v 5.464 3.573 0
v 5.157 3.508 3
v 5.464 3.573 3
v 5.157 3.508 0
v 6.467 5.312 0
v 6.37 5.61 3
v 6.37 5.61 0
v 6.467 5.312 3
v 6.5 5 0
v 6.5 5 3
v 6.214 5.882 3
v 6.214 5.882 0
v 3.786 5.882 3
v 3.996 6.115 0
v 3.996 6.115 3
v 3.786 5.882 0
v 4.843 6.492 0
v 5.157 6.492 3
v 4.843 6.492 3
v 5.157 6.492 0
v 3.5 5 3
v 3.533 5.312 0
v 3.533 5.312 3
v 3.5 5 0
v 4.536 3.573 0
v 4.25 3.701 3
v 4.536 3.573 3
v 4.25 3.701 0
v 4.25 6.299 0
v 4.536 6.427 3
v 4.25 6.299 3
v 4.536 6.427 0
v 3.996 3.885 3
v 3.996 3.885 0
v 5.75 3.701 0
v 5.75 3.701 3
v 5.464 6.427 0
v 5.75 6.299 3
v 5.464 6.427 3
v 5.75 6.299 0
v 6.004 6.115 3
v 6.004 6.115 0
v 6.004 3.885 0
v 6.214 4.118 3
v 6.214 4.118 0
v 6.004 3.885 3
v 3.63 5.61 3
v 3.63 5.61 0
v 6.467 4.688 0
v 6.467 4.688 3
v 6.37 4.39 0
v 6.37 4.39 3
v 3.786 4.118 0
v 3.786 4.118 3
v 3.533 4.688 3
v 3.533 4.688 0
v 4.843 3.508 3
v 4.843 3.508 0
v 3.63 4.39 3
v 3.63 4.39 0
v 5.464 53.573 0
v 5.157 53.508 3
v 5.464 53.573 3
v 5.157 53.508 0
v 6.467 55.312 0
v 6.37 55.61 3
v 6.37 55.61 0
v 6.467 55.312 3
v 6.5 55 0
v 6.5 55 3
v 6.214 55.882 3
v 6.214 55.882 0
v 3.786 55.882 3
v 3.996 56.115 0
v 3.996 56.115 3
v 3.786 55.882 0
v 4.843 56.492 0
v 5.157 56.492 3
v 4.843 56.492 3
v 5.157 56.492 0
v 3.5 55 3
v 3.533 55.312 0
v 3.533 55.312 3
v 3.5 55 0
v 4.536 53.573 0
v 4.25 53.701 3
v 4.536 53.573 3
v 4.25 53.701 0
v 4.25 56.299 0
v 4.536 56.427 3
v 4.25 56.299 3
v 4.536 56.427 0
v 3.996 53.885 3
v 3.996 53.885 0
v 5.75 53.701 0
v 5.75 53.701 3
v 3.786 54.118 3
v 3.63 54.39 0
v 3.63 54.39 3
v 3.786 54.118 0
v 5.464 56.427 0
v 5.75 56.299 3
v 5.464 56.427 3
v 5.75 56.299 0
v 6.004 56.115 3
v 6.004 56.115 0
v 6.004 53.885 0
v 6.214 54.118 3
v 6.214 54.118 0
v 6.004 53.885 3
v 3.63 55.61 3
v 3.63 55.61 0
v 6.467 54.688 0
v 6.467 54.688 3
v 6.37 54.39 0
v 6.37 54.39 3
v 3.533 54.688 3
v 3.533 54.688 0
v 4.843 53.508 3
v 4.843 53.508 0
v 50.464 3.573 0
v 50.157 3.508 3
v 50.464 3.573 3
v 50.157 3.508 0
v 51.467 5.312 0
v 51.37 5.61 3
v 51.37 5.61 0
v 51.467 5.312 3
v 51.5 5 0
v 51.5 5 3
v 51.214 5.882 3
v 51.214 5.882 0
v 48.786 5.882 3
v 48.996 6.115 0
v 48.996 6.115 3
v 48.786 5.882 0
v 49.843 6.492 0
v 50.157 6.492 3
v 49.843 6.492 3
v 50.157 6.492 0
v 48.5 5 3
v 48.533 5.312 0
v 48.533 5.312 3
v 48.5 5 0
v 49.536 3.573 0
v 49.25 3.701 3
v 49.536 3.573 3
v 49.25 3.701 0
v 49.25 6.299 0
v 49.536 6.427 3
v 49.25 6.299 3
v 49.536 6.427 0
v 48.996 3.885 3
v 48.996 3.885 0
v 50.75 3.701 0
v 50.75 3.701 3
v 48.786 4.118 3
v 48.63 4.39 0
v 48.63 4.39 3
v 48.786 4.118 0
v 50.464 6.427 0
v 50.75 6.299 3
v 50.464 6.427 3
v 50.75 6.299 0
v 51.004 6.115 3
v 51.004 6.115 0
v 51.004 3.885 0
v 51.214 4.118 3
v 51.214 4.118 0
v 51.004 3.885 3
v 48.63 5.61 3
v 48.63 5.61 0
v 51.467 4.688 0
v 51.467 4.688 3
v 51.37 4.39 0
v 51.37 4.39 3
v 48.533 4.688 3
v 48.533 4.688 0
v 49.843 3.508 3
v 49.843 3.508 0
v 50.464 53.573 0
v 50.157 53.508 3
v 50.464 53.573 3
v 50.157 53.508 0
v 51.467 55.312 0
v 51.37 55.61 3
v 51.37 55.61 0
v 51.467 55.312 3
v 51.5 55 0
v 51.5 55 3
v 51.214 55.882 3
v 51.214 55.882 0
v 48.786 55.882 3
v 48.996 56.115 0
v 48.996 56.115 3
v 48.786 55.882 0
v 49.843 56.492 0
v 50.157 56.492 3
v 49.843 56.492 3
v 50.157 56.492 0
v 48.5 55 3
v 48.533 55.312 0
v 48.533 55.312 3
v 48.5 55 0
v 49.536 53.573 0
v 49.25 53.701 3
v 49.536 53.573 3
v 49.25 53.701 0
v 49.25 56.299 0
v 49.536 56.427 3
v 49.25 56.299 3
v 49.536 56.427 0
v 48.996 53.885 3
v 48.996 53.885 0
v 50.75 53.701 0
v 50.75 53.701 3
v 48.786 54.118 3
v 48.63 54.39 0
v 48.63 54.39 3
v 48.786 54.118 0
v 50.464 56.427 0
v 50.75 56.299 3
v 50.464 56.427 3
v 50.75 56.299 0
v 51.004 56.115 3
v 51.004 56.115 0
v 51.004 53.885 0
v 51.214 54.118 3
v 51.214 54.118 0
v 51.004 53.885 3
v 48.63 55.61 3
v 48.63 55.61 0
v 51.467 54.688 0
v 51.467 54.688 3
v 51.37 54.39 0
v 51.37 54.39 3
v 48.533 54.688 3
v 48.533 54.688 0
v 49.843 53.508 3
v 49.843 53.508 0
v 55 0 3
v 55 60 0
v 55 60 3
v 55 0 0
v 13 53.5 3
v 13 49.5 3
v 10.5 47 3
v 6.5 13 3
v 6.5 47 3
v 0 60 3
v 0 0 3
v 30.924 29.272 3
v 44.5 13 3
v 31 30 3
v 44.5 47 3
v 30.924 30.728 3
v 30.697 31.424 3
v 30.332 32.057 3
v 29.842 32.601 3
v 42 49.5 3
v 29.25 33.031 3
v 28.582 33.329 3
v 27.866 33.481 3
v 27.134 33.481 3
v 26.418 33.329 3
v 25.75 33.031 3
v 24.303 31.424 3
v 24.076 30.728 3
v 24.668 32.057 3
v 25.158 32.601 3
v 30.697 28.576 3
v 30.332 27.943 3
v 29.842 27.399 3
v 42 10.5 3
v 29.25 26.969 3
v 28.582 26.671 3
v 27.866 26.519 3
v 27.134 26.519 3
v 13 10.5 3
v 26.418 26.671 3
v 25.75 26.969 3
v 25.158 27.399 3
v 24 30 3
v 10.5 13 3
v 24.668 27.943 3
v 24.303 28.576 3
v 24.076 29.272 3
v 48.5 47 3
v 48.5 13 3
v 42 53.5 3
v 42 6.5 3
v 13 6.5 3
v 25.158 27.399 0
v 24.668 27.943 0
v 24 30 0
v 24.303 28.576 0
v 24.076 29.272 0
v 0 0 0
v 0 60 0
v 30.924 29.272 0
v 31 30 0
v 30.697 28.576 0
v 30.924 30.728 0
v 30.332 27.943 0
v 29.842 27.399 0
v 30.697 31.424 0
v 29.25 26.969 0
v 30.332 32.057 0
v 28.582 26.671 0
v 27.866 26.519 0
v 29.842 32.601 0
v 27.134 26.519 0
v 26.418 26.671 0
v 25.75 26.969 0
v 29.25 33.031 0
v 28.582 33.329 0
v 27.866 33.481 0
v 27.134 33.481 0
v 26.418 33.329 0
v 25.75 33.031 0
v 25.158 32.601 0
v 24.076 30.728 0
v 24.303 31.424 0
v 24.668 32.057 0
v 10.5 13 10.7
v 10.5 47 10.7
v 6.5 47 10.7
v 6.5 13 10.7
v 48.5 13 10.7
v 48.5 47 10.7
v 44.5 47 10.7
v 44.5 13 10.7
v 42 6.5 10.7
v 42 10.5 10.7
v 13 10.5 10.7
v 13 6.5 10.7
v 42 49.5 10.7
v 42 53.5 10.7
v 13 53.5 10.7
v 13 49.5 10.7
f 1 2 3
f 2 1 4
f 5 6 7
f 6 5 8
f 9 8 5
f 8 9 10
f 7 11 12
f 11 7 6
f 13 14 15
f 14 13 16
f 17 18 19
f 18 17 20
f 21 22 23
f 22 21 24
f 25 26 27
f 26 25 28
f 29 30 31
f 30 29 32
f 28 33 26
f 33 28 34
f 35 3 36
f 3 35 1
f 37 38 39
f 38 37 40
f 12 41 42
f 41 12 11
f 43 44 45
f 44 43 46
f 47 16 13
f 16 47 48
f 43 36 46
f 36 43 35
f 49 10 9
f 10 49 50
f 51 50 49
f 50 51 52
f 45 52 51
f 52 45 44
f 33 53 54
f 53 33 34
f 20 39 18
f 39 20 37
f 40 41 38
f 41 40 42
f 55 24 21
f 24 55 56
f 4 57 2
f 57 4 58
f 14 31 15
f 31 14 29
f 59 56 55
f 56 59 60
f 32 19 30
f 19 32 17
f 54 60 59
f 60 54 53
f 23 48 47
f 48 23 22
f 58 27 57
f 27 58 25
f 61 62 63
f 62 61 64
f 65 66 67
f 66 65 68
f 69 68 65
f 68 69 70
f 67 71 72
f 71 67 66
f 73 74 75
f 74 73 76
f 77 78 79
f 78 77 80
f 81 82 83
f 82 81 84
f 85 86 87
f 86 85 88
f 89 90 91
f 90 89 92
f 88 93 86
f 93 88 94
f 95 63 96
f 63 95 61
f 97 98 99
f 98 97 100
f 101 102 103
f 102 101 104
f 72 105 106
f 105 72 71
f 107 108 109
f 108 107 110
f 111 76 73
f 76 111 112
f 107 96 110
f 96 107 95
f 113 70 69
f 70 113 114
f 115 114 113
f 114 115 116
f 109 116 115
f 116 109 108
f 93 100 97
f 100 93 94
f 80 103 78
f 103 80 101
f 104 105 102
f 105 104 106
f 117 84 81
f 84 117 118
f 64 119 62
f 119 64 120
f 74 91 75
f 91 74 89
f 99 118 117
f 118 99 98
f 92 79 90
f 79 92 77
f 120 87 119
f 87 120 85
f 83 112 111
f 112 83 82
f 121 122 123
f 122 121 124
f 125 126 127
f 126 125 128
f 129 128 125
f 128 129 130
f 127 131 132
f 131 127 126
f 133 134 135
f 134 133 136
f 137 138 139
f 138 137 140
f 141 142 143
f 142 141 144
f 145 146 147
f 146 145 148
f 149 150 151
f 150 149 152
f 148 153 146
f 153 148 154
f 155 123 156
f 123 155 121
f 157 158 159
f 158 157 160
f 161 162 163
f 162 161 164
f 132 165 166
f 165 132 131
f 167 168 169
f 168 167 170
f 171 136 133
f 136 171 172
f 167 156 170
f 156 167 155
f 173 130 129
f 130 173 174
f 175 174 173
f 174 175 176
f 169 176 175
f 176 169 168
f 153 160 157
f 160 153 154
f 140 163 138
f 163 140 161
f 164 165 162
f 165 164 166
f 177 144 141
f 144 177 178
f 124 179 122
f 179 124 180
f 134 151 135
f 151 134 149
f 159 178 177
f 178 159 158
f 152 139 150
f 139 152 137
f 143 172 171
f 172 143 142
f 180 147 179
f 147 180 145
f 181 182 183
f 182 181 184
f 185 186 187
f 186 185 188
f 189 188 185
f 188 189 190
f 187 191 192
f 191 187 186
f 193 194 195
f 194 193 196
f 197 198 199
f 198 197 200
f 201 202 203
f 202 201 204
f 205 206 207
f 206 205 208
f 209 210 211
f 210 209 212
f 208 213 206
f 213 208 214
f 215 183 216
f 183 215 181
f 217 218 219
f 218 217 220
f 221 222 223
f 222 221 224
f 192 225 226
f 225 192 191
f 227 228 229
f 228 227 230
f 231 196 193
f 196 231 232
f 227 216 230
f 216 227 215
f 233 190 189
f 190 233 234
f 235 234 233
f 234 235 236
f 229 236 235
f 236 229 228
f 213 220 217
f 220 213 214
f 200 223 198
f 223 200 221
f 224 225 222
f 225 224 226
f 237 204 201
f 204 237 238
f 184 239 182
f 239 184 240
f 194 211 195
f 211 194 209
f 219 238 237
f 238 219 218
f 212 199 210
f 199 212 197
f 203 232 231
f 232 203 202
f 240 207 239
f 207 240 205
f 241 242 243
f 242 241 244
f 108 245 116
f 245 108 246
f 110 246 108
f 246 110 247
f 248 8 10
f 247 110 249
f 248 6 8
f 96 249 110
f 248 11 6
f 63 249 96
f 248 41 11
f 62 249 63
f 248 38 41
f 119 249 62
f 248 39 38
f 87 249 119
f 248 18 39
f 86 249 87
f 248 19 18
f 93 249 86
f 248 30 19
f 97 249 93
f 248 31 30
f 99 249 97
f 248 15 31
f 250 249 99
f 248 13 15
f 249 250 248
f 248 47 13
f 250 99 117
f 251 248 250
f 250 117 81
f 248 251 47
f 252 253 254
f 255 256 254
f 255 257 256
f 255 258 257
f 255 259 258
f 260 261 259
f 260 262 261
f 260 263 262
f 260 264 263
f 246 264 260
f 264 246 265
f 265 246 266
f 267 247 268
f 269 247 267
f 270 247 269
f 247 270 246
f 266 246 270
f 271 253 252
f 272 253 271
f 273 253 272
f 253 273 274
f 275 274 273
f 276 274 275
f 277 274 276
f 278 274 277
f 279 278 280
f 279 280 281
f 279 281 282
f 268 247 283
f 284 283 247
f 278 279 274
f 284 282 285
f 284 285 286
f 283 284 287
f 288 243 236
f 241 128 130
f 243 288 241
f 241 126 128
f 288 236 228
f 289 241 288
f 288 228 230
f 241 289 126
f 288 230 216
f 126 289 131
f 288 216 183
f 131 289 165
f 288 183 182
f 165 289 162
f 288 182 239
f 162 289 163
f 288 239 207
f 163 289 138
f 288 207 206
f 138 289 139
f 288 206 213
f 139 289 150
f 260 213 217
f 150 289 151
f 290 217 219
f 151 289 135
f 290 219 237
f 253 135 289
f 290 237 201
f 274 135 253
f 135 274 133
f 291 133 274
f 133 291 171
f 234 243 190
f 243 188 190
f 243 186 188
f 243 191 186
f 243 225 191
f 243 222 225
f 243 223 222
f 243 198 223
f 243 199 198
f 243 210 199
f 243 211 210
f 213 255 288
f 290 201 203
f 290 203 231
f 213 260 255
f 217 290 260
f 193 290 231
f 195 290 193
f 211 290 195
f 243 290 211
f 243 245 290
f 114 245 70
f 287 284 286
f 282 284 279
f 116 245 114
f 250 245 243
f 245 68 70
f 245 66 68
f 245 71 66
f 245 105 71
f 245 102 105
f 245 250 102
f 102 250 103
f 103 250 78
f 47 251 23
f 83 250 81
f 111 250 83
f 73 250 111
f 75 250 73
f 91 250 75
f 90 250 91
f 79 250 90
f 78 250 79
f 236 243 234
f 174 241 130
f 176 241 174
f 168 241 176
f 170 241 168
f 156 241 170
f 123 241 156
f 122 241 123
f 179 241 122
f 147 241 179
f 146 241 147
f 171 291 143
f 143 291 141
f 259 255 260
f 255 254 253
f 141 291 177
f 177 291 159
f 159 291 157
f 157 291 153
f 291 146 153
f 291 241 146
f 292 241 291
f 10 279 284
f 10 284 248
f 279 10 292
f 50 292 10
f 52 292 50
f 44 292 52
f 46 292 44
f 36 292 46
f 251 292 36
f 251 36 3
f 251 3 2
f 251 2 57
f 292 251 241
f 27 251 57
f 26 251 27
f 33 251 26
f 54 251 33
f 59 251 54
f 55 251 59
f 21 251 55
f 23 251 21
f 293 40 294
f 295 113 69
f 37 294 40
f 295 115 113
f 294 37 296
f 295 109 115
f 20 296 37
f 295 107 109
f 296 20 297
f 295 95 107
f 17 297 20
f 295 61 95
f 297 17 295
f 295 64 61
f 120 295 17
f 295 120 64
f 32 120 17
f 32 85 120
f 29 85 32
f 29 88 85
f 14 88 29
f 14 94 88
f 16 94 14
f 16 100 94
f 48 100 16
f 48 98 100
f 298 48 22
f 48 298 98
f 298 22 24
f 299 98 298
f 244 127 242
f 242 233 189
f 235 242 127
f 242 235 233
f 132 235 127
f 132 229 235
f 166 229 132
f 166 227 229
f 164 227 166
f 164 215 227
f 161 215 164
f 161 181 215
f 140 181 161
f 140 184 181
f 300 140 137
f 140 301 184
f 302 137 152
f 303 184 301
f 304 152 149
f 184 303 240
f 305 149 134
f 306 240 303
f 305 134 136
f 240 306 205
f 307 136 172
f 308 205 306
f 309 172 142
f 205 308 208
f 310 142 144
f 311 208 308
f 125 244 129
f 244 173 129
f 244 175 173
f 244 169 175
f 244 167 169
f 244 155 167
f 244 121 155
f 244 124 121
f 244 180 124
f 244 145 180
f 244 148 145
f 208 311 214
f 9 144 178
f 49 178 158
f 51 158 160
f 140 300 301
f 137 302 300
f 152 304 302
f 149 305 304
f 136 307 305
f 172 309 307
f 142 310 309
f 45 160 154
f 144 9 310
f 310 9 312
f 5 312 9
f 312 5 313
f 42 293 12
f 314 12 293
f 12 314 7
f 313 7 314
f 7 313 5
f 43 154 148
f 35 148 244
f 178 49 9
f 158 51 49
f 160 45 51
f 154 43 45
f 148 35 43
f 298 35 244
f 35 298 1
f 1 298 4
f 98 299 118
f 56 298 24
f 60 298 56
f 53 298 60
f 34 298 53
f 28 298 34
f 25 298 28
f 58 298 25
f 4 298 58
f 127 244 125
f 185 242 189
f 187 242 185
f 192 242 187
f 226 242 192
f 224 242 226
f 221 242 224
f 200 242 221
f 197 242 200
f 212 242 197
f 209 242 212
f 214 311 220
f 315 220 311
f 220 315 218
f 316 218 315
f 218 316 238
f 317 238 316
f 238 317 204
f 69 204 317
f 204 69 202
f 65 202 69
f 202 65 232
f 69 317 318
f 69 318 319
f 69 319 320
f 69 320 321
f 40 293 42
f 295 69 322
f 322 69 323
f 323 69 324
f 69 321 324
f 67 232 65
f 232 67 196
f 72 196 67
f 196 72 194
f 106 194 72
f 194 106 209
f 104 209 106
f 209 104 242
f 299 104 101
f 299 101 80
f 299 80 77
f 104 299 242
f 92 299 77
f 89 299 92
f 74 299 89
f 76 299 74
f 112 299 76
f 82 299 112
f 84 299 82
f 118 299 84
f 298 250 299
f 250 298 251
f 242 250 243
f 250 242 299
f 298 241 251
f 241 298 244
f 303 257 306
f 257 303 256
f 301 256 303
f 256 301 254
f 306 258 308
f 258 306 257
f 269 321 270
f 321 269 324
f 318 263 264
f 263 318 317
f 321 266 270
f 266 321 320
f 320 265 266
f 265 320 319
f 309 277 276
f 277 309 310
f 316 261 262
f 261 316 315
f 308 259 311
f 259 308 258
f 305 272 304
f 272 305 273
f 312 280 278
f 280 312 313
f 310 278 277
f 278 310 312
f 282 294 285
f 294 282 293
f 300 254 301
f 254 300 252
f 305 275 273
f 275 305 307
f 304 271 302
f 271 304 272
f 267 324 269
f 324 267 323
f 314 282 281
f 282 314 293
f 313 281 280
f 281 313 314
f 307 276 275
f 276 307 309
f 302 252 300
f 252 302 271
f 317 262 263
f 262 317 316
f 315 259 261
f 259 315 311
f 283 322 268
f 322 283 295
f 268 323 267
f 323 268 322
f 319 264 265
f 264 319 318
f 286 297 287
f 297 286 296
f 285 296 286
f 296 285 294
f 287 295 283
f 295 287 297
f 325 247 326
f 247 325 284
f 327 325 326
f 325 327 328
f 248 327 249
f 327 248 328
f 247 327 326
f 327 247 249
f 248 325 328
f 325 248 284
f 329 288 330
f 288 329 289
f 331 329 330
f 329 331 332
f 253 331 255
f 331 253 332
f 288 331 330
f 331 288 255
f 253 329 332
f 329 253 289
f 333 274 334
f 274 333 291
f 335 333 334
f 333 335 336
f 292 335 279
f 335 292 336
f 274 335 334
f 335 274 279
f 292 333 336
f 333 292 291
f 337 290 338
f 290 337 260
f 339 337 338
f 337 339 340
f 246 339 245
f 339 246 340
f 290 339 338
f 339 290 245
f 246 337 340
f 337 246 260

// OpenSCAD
// file: potentiometer-insert.scad
/*
  3d printable insert for a control panel
  An array of potentiometers may be mounted to the insert.
  The insert can then be mounted into to the face of the control
  panel.

  The idea is, it's easy to cut a large hole in a piece of 1/4 inch
  plywood into which the insert may be fitted, but is is difficult
  (impossible) to cut the tiny holes needed for each individual fader
  in such plywood, and anyway the plywood is too thick.

  To use this file, set the following variables (in mm) and then
  include this file.

  These are intentionally commented out here.

plate_thickness = 3;
countersink = 0.01;
pot_horizontal_spacing = 25;
pot_vertical_spacing = 30;
pot_cols = 4;
pot_rows = 5;
hole_radius = 3.5;
plate_horizontal_border = 15;
plate_vertical_border = 15;
plate_height = pot_rows * pot_vertical_spacing + 2 * plate_vertical_border;
plate_width =  pot_cols * pot_horizontal_spacing + 2 * plate_horizontal_border;
screw_radius = 0.5 * 3; 
screw_edge_offset = 5;

web_thickness = 3;
web_height = 8;
web_edge_offset = screw_edge_offset + screw_radius;
web_screw_offset = 2 * web_edge_offset;
web_horiz_len = plate_width - 2 * web_screw_offset;
web_vert_len = plate_height - 2 * web_screw_offset;

*/

$fn=30;

module undrilled_plate()
{
	cube(size = [plate_width, plate_height, plate_thickness]);
}

module drill_hole(x, y, r)
{
	translate(v = [x, y, -plate_thickness * 0.05])
		cylinder(r1 = r, r2 = r, h = plate_thickness * 1.1);
}

module plate_pot_holes()
{
	for (row = [0 : 1 : pot_rows - 1]) {
		y = plate_vertical_border + (row + 0.5) * pot_vertical_spacing;
		for (col = [0 : 1 : pot_cols - 1]) {
			x = plate_horizontal_border + (col + 0.5) * pot_horizontal_spacing;
			drill_hole(x, y, hole_radius);
		}
	}
}

module plate_screw_holes()
{
	drill_hole(screw_edge_offset, screw_edge_offset, screw_radius);
	drill_hole(screw_edge_offset, plate_height - screw_edge_offset, screw_radius);
	drill_hole(plate_width - screw_edge_offset, screw_edge_offset, screw_radius);
	drill_hole(plate_width - screw_edge_offset, plate_height - screw_edge_offset, screw_radius);
}

module plate()
{
	difference() {
		undrilled_plate();
		plate_pot_holes();
		plate_screw_holes();
	}
}

module webbing()
{
	/* Vertical webbing */
	translate(v = [web_edge_offset, web_screw_offset, plate_thickness * 0.9])
		cube(size = [web_thickness, web_vert_len, web_height]);
	translate(v = [plate_width - web_edge_offset - web_thickness, web_screw_offset, plate_thickness * 0.9])
		cube(size = [web_thickness, web_vert_len, web_height]);
	translate(v = [web_screw_offset, web_edge_offset, plate_thickness * 0.9])
		cube(size = [web_horiz_len, web_thickness, web_height]);
	translate(v = [web_screw_offset, plate_height - web_edge_offset - web_thickness, plate_thickness * 0.9])
		cube(size = [web_horiz_len, web_thickness, web_height]);
}

module pot_array_plate()
{
	union() {
		plate();
		webbing();
	}
}

pot_array_plate();
// main file
/*
  3d printable insert for navigation zoom pot insert
*/

plate_thickness = 3;
countersink = 0.01;
pot_horizontal_spacing = 25;
pot_vertical_spacing = 30;
pot_cols = 1;
pot_rows = 1;
hole_radius = 3.5;
plate_horizontal_border = 15;
plate_vertical_border = 15;
plate_height = pot_rows * pot_vertical_spacing + 2 * plate_vertical_border;
plate_width =  pot_cols * pot_horizontal_spacing + 2 * plate_horizontal_border;
screw_radius = 0.5 * 3; 
screw_edge_offset = 5;

web_thickness = 4;
web_height = 8;
web_edge_offset = screw_edge_offset + screw_radius;
web_screw_offset = 2 * web_edge_offset;
web_horiz_len = plate_width - 2 * web_screw_offset;
web_vert_len = plate_height - 2 * web_screw_offset;

include <potentiometer-insert.scad>

pot_array_plate();
